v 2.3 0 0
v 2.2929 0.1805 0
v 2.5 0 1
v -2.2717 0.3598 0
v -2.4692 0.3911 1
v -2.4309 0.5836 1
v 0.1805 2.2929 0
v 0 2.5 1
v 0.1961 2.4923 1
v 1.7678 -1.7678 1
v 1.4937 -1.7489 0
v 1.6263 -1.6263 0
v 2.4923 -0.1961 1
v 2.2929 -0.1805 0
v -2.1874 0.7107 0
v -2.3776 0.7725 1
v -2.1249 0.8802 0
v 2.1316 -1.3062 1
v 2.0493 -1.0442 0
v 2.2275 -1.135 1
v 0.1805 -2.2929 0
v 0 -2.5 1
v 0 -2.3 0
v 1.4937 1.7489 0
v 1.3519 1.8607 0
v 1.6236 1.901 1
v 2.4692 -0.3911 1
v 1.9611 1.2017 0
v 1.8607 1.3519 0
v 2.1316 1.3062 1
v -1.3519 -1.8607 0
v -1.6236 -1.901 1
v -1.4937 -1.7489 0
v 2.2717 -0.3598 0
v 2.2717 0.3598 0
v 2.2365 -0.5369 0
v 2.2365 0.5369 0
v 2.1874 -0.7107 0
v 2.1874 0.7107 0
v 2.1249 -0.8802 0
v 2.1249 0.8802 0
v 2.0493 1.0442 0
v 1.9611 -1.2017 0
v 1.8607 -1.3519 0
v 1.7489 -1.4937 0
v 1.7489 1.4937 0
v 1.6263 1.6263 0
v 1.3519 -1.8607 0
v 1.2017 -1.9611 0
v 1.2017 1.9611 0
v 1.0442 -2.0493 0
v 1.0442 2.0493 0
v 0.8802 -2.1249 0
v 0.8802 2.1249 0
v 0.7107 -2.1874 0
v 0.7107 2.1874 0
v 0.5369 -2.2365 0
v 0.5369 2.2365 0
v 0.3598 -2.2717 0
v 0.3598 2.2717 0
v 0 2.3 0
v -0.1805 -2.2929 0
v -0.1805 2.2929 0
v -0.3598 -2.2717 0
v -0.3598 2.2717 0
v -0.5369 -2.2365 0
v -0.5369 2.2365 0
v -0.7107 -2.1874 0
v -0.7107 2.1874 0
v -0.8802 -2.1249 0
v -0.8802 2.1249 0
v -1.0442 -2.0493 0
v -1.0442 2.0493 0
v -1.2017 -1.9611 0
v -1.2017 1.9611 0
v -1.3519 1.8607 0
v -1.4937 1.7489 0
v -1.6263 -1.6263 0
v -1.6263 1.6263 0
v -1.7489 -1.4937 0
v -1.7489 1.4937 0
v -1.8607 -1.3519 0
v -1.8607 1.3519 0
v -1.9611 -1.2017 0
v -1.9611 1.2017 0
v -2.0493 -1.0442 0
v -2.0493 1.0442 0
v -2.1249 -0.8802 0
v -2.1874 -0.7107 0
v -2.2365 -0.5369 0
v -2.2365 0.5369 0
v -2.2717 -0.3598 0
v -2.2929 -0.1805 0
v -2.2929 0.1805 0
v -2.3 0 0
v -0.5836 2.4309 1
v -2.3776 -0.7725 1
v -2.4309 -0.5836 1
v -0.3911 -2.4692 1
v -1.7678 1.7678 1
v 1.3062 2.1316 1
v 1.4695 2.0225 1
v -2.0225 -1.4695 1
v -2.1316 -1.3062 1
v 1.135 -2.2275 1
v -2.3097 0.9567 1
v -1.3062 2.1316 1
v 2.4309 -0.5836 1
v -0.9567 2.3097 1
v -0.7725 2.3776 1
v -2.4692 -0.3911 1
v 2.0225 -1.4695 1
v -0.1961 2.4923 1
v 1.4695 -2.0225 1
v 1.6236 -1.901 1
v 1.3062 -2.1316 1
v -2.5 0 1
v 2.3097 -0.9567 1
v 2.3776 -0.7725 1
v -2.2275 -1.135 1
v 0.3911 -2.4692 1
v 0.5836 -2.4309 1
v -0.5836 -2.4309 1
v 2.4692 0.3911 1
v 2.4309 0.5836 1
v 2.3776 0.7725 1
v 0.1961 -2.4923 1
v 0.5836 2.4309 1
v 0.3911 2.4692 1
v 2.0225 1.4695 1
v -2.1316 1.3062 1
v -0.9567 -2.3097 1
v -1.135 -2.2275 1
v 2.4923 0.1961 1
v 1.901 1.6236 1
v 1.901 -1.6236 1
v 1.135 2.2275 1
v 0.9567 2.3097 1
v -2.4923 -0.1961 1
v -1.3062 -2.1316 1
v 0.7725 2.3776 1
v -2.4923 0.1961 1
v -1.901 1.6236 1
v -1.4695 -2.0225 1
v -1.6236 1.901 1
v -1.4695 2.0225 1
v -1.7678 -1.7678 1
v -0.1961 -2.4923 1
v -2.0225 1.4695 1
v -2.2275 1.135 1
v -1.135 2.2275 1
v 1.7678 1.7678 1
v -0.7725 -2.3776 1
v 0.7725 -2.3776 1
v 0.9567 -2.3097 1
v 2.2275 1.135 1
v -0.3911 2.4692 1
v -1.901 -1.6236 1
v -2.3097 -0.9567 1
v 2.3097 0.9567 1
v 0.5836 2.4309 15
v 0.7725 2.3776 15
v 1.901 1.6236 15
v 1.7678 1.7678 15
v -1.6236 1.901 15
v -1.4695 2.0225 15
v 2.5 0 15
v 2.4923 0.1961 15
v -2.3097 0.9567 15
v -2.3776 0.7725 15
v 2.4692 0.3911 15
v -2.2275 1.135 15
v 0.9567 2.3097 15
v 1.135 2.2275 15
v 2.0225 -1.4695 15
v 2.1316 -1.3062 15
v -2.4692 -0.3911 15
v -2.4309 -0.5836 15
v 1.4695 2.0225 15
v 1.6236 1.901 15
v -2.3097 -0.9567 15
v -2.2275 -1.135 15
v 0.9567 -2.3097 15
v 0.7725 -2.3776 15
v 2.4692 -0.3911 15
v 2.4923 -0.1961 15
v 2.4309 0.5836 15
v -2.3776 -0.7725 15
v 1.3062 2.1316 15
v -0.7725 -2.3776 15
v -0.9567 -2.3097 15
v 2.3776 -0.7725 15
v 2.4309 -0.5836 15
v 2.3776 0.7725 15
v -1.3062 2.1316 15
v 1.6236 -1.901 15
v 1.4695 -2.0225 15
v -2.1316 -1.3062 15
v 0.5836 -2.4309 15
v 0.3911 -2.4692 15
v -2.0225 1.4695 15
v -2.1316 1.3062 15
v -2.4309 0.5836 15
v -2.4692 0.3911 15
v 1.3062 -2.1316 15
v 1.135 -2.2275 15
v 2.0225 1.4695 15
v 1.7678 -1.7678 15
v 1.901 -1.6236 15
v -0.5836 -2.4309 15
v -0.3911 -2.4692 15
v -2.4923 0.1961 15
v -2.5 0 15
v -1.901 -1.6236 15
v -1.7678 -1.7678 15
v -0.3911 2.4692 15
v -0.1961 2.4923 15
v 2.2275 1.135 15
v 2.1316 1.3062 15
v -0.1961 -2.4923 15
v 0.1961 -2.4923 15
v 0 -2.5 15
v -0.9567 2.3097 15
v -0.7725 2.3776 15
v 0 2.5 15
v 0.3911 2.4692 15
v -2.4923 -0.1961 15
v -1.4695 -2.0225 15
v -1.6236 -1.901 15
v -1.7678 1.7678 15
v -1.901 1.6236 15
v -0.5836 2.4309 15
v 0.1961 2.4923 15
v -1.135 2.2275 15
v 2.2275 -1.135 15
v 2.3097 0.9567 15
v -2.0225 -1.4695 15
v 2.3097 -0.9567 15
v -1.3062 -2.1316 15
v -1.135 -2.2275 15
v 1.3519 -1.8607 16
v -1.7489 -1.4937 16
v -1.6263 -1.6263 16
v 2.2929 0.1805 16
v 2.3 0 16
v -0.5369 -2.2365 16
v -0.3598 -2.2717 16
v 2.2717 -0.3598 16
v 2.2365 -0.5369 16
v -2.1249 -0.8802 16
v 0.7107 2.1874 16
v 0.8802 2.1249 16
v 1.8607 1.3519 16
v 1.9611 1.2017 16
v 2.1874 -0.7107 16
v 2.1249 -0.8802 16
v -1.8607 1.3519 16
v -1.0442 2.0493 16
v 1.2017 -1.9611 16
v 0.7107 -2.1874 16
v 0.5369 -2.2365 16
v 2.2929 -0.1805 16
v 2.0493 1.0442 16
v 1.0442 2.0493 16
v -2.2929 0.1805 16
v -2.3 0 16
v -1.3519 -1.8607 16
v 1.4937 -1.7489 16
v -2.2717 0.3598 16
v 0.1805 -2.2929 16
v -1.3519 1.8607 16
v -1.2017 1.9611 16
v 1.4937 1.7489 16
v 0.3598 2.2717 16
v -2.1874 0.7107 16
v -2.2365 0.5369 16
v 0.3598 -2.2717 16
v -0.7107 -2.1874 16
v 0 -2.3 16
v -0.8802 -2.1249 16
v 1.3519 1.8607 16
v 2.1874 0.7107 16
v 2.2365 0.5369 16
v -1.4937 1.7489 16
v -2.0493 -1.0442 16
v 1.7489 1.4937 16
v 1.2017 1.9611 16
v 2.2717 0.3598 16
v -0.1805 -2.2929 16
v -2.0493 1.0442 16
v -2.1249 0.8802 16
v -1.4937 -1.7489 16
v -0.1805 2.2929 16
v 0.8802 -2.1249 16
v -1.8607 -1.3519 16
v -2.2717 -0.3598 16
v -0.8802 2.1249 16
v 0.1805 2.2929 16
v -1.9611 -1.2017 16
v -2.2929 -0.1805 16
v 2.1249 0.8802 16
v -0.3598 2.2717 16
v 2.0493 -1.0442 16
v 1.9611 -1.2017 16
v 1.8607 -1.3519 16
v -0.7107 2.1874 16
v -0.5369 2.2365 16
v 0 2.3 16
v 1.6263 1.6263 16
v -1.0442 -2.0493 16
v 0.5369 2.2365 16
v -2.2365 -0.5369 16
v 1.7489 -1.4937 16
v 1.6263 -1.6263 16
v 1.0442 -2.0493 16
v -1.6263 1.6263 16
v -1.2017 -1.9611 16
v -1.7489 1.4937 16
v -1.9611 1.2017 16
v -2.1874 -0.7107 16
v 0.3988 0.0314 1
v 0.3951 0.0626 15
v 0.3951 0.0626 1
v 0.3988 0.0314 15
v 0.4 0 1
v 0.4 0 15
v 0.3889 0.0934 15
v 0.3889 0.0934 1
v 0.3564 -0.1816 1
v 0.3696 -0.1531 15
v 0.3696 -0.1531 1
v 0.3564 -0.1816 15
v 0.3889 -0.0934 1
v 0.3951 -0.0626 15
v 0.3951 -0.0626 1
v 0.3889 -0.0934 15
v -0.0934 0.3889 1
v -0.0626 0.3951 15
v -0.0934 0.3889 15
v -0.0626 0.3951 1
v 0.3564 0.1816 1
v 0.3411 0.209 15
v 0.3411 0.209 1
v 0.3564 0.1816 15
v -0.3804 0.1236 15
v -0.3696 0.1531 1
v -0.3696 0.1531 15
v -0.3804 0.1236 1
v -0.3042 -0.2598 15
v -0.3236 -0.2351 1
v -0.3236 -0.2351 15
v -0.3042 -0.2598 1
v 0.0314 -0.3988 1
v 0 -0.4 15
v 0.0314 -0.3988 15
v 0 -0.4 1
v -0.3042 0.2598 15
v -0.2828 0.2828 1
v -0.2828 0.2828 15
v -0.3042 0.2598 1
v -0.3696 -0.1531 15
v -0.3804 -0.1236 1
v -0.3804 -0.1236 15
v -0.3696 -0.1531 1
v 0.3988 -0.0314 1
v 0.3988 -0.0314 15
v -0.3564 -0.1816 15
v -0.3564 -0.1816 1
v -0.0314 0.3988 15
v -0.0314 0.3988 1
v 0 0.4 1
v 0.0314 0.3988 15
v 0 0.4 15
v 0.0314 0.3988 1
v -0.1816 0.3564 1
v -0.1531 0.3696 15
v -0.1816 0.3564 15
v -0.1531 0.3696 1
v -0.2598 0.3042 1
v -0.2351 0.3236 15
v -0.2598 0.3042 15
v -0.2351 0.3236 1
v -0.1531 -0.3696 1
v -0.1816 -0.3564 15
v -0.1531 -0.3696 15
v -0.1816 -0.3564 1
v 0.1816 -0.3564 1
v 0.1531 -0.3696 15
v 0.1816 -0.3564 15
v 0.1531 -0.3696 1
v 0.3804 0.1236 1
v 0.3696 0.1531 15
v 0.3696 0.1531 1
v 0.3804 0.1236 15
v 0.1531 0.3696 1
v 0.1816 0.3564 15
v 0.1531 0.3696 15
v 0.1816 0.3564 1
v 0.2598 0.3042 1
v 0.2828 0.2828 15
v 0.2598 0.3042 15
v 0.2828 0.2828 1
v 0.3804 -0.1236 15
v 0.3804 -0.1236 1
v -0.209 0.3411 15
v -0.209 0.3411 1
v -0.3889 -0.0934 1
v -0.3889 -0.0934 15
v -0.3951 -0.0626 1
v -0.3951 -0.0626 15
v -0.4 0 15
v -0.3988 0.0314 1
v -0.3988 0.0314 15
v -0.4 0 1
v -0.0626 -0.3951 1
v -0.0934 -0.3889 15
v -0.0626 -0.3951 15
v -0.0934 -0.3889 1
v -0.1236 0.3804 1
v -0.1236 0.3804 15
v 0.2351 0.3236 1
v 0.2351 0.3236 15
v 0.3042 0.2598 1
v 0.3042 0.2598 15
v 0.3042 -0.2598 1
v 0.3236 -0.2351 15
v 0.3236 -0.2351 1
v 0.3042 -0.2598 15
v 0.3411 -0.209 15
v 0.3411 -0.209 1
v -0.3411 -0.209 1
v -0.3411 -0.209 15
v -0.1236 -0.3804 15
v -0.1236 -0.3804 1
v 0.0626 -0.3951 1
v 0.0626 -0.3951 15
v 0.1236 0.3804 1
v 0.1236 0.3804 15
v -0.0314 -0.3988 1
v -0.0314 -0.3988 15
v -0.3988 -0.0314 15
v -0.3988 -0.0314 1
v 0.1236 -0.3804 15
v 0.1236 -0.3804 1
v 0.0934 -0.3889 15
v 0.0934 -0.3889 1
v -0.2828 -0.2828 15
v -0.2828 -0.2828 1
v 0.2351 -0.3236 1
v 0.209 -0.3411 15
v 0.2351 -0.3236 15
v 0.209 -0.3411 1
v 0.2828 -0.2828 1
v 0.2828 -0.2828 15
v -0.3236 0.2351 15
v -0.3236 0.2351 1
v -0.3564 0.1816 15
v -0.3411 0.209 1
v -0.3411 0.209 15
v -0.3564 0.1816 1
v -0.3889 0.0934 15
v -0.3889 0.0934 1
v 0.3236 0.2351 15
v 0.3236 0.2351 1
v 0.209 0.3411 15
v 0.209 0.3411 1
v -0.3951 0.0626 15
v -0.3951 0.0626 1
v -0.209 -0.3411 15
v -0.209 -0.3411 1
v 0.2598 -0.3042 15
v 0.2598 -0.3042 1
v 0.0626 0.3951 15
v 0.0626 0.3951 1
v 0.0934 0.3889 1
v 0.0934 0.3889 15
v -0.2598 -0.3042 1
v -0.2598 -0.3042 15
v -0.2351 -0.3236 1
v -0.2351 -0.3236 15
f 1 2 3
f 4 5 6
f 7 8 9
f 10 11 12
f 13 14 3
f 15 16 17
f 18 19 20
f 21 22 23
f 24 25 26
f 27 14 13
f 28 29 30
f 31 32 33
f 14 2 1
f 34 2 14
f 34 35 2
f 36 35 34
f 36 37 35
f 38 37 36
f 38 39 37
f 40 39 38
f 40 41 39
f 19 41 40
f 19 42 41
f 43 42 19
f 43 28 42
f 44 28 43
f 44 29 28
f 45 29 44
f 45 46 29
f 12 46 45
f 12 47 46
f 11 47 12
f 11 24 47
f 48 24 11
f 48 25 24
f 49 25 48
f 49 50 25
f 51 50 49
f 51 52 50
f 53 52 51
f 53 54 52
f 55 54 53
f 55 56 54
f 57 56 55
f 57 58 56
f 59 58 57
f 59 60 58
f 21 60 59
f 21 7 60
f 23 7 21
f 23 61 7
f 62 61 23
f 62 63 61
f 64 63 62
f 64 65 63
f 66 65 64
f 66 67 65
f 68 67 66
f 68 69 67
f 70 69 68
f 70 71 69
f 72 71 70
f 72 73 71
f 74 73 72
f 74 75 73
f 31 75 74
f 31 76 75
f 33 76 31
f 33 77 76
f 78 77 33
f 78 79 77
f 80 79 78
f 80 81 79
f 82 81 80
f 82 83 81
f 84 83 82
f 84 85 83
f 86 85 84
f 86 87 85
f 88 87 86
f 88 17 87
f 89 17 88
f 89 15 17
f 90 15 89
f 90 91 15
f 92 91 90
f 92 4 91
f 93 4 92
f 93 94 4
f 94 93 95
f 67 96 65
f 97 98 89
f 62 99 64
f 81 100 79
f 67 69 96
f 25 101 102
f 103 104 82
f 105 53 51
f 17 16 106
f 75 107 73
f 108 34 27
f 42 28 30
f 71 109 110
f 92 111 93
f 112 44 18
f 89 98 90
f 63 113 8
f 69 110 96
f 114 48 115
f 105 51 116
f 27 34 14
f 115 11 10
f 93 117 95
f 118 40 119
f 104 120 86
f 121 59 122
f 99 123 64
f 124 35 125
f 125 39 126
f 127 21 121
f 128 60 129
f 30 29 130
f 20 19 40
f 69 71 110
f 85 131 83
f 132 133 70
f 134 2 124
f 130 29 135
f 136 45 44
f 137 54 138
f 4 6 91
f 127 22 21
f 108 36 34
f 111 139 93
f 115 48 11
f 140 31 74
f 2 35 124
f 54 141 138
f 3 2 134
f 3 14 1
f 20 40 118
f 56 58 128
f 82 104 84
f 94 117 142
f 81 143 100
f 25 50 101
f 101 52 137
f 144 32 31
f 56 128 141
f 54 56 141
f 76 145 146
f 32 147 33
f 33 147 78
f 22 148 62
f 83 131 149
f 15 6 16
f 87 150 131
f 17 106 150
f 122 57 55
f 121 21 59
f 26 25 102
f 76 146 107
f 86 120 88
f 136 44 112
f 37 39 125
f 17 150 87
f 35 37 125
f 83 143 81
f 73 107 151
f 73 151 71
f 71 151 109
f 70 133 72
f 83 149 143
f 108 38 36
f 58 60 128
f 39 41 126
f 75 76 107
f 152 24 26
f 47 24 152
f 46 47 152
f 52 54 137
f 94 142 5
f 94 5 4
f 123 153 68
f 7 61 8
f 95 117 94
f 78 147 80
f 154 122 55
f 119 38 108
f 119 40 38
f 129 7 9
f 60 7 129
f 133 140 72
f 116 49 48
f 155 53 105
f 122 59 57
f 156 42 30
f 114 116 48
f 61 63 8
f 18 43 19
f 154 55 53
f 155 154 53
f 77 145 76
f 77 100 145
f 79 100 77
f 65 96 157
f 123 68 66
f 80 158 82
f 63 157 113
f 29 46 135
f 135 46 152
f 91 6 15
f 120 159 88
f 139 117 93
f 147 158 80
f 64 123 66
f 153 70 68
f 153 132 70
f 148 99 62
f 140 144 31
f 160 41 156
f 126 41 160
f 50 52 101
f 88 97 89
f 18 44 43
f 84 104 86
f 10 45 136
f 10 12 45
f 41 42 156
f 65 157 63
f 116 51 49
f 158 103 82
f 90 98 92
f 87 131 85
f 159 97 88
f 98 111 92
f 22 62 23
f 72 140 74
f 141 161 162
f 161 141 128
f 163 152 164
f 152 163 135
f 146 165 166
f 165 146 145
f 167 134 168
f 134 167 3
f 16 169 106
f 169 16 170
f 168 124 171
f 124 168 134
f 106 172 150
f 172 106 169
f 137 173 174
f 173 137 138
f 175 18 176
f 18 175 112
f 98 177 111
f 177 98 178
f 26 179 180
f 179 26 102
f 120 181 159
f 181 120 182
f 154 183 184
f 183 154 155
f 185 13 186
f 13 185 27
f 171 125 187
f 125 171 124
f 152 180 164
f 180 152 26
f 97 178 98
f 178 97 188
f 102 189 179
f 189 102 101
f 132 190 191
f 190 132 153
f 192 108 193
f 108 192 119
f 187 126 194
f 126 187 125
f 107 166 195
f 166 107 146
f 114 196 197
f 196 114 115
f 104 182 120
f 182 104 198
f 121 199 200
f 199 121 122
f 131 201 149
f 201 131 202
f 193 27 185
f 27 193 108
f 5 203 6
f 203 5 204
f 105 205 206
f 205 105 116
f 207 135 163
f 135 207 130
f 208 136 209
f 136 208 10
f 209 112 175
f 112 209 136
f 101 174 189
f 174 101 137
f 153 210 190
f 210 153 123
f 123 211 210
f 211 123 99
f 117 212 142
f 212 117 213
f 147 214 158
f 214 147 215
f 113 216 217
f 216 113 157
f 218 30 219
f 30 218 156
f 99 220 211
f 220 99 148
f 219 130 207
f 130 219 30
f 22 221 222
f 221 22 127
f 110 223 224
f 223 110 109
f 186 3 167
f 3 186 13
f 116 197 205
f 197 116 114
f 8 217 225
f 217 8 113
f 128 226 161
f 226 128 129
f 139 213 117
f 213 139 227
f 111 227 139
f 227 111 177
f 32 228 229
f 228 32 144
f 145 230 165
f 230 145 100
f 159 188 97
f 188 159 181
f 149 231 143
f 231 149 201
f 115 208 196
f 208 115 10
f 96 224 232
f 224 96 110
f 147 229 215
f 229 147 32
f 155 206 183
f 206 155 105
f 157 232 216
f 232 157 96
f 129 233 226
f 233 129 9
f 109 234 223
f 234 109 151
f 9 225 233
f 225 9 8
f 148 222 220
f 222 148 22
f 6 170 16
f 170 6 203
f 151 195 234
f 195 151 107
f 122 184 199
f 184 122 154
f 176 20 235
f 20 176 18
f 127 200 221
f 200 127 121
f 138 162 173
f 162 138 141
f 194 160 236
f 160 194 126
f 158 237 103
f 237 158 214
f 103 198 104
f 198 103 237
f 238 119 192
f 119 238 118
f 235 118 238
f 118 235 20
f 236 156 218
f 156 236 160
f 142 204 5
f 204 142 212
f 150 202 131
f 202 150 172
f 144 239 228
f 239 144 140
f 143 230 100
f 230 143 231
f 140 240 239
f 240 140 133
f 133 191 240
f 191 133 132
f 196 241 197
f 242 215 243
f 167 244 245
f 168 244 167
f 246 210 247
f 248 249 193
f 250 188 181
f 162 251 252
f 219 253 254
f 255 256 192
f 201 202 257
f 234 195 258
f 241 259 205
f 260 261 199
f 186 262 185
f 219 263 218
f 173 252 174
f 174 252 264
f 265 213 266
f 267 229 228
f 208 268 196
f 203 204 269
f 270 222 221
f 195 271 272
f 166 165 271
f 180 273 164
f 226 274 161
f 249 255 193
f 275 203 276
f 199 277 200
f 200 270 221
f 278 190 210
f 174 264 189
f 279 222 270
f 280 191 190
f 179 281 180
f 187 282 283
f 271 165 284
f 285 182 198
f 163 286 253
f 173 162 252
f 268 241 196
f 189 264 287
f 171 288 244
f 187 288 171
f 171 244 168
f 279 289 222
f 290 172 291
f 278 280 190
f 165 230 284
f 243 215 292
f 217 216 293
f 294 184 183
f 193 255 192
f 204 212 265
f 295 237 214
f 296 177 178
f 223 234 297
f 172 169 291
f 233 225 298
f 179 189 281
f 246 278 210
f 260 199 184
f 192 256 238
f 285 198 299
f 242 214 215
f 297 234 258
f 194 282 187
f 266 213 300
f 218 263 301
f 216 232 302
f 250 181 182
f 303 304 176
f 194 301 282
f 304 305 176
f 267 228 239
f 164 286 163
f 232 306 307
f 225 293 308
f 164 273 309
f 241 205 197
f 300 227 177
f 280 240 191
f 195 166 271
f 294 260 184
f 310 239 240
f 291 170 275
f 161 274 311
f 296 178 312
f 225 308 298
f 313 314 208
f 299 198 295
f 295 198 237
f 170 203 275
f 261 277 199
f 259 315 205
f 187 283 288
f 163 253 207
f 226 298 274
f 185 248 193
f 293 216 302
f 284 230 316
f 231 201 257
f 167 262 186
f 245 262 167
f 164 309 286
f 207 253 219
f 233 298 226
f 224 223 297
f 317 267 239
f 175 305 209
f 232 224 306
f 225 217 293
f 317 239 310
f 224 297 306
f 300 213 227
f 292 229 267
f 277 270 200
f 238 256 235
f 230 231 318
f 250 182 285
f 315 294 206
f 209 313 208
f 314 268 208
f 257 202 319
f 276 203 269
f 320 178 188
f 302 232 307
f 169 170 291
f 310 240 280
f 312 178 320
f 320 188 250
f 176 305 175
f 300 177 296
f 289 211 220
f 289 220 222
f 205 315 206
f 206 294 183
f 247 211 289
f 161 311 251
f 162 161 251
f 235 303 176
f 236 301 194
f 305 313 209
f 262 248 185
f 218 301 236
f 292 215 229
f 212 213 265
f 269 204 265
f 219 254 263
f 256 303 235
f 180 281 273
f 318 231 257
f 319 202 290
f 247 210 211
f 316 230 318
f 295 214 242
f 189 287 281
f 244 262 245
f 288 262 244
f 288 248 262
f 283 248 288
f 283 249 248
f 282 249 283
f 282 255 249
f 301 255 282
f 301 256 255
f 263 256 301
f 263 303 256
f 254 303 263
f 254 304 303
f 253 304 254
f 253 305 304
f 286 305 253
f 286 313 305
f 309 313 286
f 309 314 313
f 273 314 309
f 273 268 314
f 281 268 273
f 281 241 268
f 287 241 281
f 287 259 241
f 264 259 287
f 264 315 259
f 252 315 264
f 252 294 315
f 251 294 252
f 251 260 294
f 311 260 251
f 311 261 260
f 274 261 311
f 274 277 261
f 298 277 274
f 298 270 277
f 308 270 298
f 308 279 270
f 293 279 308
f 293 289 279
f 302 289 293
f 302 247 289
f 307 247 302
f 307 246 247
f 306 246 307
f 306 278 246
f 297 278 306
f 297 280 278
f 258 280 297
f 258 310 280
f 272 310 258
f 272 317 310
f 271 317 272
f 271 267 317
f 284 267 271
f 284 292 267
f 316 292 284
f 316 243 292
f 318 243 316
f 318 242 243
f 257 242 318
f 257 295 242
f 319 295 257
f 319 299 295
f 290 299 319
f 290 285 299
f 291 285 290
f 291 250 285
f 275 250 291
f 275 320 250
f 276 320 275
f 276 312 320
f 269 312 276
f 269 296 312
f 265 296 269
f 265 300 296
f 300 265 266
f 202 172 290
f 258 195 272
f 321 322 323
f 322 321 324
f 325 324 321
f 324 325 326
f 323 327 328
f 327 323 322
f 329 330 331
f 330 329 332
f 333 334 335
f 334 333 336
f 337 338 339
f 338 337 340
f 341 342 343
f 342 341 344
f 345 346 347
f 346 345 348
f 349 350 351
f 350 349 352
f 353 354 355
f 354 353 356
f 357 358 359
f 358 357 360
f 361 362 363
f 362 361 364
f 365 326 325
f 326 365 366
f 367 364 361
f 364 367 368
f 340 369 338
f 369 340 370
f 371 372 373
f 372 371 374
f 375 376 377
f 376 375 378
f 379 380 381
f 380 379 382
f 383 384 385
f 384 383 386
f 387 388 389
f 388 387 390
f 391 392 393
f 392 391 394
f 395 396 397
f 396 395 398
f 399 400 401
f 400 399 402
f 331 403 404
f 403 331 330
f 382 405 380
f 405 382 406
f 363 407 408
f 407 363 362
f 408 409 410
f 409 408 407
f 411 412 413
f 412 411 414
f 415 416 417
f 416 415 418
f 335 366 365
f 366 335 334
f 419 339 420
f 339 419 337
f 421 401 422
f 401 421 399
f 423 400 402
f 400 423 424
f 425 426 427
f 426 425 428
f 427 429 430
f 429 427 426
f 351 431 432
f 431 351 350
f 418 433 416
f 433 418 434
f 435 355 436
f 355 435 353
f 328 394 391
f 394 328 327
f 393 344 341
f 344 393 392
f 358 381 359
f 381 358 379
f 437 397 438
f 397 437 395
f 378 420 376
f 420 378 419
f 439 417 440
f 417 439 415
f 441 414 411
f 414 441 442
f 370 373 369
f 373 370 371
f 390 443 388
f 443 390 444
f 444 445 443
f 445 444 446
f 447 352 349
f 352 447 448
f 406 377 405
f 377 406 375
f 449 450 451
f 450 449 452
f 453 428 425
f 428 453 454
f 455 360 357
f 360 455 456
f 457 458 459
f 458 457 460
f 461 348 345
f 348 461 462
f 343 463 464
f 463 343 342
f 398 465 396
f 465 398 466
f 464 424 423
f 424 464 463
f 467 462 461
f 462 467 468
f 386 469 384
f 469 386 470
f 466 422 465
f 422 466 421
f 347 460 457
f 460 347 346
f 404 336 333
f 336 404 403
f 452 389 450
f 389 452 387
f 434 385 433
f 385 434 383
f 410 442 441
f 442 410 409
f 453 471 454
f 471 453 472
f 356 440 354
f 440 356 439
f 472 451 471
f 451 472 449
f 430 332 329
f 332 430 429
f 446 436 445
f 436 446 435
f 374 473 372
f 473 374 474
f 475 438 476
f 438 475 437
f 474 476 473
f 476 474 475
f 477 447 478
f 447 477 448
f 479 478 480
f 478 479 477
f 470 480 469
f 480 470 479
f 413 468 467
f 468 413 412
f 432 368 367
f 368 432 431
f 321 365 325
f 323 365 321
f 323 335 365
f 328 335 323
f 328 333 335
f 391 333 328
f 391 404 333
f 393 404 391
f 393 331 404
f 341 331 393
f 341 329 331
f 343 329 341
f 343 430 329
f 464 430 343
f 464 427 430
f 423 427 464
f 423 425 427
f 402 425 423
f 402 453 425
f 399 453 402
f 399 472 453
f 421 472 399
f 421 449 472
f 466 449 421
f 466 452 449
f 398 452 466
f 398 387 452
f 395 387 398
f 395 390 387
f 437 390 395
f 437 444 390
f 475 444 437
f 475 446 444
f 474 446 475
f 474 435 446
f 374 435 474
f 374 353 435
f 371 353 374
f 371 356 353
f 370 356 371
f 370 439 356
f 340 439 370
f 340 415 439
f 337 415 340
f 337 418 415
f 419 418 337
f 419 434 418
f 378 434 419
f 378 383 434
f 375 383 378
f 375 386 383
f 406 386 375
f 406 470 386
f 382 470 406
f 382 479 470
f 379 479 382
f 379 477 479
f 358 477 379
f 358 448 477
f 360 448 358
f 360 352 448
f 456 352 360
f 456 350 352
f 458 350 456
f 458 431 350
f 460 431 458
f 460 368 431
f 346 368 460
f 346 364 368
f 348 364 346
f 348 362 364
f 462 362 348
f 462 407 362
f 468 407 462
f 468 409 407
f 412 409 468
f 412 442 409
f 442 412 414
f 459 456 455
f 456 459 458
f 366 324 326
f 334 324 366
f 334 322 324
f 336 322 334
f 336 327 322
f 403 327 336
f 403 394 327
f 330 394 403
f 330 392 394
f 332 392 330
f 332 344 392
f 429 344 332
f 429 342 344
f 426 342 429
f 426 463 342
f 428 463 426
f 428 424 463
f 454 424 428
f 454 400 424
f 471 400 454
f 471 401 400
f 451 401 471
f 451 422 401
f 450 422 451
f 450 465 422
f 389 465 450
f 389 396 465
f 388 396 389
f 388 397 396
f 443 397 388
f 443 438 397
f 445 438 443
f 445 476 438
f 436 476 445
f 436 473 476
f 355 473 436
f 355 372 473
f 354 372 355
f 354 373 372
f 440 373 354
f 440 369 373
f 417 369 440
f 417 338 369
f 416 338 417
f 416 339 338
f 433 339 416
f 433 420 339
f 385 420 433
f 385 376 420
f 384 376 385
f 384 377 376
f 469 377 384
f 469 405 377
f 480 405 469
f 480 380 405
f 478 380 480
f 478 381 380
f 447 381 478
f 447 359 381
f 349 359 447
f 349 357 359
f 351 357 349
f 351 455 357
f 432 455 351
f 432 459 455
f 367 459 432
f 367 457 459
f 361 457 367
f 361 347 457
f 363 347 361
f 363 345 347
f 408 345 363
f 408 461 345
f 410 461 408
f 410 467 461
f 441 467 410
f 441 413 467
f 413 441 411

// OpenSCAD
// PRUSA iteration3
// Idler shaft
// GNU GPL v3
// Josef Průša <iam@josefprusa.cz> and contributors
// http://www.reprap.org/wiki/Prusa_Mendel
// http://prusamendel.org


difference()
{
    union()
    {
        cylinder( h=1, r2=2.5, r1=2.3, $fn=80 );    
        translate([0,0,1]) cylinder( h=14, r=2.5, $fn=80 );    
        translate([0,0,15])  cylinder( h=1, r1=2.5, r2=2.3, $fn=80 );    
    }
        translate([0,0,1]) cylinder( h=14, r=0.4, $fn=80 );    
}
